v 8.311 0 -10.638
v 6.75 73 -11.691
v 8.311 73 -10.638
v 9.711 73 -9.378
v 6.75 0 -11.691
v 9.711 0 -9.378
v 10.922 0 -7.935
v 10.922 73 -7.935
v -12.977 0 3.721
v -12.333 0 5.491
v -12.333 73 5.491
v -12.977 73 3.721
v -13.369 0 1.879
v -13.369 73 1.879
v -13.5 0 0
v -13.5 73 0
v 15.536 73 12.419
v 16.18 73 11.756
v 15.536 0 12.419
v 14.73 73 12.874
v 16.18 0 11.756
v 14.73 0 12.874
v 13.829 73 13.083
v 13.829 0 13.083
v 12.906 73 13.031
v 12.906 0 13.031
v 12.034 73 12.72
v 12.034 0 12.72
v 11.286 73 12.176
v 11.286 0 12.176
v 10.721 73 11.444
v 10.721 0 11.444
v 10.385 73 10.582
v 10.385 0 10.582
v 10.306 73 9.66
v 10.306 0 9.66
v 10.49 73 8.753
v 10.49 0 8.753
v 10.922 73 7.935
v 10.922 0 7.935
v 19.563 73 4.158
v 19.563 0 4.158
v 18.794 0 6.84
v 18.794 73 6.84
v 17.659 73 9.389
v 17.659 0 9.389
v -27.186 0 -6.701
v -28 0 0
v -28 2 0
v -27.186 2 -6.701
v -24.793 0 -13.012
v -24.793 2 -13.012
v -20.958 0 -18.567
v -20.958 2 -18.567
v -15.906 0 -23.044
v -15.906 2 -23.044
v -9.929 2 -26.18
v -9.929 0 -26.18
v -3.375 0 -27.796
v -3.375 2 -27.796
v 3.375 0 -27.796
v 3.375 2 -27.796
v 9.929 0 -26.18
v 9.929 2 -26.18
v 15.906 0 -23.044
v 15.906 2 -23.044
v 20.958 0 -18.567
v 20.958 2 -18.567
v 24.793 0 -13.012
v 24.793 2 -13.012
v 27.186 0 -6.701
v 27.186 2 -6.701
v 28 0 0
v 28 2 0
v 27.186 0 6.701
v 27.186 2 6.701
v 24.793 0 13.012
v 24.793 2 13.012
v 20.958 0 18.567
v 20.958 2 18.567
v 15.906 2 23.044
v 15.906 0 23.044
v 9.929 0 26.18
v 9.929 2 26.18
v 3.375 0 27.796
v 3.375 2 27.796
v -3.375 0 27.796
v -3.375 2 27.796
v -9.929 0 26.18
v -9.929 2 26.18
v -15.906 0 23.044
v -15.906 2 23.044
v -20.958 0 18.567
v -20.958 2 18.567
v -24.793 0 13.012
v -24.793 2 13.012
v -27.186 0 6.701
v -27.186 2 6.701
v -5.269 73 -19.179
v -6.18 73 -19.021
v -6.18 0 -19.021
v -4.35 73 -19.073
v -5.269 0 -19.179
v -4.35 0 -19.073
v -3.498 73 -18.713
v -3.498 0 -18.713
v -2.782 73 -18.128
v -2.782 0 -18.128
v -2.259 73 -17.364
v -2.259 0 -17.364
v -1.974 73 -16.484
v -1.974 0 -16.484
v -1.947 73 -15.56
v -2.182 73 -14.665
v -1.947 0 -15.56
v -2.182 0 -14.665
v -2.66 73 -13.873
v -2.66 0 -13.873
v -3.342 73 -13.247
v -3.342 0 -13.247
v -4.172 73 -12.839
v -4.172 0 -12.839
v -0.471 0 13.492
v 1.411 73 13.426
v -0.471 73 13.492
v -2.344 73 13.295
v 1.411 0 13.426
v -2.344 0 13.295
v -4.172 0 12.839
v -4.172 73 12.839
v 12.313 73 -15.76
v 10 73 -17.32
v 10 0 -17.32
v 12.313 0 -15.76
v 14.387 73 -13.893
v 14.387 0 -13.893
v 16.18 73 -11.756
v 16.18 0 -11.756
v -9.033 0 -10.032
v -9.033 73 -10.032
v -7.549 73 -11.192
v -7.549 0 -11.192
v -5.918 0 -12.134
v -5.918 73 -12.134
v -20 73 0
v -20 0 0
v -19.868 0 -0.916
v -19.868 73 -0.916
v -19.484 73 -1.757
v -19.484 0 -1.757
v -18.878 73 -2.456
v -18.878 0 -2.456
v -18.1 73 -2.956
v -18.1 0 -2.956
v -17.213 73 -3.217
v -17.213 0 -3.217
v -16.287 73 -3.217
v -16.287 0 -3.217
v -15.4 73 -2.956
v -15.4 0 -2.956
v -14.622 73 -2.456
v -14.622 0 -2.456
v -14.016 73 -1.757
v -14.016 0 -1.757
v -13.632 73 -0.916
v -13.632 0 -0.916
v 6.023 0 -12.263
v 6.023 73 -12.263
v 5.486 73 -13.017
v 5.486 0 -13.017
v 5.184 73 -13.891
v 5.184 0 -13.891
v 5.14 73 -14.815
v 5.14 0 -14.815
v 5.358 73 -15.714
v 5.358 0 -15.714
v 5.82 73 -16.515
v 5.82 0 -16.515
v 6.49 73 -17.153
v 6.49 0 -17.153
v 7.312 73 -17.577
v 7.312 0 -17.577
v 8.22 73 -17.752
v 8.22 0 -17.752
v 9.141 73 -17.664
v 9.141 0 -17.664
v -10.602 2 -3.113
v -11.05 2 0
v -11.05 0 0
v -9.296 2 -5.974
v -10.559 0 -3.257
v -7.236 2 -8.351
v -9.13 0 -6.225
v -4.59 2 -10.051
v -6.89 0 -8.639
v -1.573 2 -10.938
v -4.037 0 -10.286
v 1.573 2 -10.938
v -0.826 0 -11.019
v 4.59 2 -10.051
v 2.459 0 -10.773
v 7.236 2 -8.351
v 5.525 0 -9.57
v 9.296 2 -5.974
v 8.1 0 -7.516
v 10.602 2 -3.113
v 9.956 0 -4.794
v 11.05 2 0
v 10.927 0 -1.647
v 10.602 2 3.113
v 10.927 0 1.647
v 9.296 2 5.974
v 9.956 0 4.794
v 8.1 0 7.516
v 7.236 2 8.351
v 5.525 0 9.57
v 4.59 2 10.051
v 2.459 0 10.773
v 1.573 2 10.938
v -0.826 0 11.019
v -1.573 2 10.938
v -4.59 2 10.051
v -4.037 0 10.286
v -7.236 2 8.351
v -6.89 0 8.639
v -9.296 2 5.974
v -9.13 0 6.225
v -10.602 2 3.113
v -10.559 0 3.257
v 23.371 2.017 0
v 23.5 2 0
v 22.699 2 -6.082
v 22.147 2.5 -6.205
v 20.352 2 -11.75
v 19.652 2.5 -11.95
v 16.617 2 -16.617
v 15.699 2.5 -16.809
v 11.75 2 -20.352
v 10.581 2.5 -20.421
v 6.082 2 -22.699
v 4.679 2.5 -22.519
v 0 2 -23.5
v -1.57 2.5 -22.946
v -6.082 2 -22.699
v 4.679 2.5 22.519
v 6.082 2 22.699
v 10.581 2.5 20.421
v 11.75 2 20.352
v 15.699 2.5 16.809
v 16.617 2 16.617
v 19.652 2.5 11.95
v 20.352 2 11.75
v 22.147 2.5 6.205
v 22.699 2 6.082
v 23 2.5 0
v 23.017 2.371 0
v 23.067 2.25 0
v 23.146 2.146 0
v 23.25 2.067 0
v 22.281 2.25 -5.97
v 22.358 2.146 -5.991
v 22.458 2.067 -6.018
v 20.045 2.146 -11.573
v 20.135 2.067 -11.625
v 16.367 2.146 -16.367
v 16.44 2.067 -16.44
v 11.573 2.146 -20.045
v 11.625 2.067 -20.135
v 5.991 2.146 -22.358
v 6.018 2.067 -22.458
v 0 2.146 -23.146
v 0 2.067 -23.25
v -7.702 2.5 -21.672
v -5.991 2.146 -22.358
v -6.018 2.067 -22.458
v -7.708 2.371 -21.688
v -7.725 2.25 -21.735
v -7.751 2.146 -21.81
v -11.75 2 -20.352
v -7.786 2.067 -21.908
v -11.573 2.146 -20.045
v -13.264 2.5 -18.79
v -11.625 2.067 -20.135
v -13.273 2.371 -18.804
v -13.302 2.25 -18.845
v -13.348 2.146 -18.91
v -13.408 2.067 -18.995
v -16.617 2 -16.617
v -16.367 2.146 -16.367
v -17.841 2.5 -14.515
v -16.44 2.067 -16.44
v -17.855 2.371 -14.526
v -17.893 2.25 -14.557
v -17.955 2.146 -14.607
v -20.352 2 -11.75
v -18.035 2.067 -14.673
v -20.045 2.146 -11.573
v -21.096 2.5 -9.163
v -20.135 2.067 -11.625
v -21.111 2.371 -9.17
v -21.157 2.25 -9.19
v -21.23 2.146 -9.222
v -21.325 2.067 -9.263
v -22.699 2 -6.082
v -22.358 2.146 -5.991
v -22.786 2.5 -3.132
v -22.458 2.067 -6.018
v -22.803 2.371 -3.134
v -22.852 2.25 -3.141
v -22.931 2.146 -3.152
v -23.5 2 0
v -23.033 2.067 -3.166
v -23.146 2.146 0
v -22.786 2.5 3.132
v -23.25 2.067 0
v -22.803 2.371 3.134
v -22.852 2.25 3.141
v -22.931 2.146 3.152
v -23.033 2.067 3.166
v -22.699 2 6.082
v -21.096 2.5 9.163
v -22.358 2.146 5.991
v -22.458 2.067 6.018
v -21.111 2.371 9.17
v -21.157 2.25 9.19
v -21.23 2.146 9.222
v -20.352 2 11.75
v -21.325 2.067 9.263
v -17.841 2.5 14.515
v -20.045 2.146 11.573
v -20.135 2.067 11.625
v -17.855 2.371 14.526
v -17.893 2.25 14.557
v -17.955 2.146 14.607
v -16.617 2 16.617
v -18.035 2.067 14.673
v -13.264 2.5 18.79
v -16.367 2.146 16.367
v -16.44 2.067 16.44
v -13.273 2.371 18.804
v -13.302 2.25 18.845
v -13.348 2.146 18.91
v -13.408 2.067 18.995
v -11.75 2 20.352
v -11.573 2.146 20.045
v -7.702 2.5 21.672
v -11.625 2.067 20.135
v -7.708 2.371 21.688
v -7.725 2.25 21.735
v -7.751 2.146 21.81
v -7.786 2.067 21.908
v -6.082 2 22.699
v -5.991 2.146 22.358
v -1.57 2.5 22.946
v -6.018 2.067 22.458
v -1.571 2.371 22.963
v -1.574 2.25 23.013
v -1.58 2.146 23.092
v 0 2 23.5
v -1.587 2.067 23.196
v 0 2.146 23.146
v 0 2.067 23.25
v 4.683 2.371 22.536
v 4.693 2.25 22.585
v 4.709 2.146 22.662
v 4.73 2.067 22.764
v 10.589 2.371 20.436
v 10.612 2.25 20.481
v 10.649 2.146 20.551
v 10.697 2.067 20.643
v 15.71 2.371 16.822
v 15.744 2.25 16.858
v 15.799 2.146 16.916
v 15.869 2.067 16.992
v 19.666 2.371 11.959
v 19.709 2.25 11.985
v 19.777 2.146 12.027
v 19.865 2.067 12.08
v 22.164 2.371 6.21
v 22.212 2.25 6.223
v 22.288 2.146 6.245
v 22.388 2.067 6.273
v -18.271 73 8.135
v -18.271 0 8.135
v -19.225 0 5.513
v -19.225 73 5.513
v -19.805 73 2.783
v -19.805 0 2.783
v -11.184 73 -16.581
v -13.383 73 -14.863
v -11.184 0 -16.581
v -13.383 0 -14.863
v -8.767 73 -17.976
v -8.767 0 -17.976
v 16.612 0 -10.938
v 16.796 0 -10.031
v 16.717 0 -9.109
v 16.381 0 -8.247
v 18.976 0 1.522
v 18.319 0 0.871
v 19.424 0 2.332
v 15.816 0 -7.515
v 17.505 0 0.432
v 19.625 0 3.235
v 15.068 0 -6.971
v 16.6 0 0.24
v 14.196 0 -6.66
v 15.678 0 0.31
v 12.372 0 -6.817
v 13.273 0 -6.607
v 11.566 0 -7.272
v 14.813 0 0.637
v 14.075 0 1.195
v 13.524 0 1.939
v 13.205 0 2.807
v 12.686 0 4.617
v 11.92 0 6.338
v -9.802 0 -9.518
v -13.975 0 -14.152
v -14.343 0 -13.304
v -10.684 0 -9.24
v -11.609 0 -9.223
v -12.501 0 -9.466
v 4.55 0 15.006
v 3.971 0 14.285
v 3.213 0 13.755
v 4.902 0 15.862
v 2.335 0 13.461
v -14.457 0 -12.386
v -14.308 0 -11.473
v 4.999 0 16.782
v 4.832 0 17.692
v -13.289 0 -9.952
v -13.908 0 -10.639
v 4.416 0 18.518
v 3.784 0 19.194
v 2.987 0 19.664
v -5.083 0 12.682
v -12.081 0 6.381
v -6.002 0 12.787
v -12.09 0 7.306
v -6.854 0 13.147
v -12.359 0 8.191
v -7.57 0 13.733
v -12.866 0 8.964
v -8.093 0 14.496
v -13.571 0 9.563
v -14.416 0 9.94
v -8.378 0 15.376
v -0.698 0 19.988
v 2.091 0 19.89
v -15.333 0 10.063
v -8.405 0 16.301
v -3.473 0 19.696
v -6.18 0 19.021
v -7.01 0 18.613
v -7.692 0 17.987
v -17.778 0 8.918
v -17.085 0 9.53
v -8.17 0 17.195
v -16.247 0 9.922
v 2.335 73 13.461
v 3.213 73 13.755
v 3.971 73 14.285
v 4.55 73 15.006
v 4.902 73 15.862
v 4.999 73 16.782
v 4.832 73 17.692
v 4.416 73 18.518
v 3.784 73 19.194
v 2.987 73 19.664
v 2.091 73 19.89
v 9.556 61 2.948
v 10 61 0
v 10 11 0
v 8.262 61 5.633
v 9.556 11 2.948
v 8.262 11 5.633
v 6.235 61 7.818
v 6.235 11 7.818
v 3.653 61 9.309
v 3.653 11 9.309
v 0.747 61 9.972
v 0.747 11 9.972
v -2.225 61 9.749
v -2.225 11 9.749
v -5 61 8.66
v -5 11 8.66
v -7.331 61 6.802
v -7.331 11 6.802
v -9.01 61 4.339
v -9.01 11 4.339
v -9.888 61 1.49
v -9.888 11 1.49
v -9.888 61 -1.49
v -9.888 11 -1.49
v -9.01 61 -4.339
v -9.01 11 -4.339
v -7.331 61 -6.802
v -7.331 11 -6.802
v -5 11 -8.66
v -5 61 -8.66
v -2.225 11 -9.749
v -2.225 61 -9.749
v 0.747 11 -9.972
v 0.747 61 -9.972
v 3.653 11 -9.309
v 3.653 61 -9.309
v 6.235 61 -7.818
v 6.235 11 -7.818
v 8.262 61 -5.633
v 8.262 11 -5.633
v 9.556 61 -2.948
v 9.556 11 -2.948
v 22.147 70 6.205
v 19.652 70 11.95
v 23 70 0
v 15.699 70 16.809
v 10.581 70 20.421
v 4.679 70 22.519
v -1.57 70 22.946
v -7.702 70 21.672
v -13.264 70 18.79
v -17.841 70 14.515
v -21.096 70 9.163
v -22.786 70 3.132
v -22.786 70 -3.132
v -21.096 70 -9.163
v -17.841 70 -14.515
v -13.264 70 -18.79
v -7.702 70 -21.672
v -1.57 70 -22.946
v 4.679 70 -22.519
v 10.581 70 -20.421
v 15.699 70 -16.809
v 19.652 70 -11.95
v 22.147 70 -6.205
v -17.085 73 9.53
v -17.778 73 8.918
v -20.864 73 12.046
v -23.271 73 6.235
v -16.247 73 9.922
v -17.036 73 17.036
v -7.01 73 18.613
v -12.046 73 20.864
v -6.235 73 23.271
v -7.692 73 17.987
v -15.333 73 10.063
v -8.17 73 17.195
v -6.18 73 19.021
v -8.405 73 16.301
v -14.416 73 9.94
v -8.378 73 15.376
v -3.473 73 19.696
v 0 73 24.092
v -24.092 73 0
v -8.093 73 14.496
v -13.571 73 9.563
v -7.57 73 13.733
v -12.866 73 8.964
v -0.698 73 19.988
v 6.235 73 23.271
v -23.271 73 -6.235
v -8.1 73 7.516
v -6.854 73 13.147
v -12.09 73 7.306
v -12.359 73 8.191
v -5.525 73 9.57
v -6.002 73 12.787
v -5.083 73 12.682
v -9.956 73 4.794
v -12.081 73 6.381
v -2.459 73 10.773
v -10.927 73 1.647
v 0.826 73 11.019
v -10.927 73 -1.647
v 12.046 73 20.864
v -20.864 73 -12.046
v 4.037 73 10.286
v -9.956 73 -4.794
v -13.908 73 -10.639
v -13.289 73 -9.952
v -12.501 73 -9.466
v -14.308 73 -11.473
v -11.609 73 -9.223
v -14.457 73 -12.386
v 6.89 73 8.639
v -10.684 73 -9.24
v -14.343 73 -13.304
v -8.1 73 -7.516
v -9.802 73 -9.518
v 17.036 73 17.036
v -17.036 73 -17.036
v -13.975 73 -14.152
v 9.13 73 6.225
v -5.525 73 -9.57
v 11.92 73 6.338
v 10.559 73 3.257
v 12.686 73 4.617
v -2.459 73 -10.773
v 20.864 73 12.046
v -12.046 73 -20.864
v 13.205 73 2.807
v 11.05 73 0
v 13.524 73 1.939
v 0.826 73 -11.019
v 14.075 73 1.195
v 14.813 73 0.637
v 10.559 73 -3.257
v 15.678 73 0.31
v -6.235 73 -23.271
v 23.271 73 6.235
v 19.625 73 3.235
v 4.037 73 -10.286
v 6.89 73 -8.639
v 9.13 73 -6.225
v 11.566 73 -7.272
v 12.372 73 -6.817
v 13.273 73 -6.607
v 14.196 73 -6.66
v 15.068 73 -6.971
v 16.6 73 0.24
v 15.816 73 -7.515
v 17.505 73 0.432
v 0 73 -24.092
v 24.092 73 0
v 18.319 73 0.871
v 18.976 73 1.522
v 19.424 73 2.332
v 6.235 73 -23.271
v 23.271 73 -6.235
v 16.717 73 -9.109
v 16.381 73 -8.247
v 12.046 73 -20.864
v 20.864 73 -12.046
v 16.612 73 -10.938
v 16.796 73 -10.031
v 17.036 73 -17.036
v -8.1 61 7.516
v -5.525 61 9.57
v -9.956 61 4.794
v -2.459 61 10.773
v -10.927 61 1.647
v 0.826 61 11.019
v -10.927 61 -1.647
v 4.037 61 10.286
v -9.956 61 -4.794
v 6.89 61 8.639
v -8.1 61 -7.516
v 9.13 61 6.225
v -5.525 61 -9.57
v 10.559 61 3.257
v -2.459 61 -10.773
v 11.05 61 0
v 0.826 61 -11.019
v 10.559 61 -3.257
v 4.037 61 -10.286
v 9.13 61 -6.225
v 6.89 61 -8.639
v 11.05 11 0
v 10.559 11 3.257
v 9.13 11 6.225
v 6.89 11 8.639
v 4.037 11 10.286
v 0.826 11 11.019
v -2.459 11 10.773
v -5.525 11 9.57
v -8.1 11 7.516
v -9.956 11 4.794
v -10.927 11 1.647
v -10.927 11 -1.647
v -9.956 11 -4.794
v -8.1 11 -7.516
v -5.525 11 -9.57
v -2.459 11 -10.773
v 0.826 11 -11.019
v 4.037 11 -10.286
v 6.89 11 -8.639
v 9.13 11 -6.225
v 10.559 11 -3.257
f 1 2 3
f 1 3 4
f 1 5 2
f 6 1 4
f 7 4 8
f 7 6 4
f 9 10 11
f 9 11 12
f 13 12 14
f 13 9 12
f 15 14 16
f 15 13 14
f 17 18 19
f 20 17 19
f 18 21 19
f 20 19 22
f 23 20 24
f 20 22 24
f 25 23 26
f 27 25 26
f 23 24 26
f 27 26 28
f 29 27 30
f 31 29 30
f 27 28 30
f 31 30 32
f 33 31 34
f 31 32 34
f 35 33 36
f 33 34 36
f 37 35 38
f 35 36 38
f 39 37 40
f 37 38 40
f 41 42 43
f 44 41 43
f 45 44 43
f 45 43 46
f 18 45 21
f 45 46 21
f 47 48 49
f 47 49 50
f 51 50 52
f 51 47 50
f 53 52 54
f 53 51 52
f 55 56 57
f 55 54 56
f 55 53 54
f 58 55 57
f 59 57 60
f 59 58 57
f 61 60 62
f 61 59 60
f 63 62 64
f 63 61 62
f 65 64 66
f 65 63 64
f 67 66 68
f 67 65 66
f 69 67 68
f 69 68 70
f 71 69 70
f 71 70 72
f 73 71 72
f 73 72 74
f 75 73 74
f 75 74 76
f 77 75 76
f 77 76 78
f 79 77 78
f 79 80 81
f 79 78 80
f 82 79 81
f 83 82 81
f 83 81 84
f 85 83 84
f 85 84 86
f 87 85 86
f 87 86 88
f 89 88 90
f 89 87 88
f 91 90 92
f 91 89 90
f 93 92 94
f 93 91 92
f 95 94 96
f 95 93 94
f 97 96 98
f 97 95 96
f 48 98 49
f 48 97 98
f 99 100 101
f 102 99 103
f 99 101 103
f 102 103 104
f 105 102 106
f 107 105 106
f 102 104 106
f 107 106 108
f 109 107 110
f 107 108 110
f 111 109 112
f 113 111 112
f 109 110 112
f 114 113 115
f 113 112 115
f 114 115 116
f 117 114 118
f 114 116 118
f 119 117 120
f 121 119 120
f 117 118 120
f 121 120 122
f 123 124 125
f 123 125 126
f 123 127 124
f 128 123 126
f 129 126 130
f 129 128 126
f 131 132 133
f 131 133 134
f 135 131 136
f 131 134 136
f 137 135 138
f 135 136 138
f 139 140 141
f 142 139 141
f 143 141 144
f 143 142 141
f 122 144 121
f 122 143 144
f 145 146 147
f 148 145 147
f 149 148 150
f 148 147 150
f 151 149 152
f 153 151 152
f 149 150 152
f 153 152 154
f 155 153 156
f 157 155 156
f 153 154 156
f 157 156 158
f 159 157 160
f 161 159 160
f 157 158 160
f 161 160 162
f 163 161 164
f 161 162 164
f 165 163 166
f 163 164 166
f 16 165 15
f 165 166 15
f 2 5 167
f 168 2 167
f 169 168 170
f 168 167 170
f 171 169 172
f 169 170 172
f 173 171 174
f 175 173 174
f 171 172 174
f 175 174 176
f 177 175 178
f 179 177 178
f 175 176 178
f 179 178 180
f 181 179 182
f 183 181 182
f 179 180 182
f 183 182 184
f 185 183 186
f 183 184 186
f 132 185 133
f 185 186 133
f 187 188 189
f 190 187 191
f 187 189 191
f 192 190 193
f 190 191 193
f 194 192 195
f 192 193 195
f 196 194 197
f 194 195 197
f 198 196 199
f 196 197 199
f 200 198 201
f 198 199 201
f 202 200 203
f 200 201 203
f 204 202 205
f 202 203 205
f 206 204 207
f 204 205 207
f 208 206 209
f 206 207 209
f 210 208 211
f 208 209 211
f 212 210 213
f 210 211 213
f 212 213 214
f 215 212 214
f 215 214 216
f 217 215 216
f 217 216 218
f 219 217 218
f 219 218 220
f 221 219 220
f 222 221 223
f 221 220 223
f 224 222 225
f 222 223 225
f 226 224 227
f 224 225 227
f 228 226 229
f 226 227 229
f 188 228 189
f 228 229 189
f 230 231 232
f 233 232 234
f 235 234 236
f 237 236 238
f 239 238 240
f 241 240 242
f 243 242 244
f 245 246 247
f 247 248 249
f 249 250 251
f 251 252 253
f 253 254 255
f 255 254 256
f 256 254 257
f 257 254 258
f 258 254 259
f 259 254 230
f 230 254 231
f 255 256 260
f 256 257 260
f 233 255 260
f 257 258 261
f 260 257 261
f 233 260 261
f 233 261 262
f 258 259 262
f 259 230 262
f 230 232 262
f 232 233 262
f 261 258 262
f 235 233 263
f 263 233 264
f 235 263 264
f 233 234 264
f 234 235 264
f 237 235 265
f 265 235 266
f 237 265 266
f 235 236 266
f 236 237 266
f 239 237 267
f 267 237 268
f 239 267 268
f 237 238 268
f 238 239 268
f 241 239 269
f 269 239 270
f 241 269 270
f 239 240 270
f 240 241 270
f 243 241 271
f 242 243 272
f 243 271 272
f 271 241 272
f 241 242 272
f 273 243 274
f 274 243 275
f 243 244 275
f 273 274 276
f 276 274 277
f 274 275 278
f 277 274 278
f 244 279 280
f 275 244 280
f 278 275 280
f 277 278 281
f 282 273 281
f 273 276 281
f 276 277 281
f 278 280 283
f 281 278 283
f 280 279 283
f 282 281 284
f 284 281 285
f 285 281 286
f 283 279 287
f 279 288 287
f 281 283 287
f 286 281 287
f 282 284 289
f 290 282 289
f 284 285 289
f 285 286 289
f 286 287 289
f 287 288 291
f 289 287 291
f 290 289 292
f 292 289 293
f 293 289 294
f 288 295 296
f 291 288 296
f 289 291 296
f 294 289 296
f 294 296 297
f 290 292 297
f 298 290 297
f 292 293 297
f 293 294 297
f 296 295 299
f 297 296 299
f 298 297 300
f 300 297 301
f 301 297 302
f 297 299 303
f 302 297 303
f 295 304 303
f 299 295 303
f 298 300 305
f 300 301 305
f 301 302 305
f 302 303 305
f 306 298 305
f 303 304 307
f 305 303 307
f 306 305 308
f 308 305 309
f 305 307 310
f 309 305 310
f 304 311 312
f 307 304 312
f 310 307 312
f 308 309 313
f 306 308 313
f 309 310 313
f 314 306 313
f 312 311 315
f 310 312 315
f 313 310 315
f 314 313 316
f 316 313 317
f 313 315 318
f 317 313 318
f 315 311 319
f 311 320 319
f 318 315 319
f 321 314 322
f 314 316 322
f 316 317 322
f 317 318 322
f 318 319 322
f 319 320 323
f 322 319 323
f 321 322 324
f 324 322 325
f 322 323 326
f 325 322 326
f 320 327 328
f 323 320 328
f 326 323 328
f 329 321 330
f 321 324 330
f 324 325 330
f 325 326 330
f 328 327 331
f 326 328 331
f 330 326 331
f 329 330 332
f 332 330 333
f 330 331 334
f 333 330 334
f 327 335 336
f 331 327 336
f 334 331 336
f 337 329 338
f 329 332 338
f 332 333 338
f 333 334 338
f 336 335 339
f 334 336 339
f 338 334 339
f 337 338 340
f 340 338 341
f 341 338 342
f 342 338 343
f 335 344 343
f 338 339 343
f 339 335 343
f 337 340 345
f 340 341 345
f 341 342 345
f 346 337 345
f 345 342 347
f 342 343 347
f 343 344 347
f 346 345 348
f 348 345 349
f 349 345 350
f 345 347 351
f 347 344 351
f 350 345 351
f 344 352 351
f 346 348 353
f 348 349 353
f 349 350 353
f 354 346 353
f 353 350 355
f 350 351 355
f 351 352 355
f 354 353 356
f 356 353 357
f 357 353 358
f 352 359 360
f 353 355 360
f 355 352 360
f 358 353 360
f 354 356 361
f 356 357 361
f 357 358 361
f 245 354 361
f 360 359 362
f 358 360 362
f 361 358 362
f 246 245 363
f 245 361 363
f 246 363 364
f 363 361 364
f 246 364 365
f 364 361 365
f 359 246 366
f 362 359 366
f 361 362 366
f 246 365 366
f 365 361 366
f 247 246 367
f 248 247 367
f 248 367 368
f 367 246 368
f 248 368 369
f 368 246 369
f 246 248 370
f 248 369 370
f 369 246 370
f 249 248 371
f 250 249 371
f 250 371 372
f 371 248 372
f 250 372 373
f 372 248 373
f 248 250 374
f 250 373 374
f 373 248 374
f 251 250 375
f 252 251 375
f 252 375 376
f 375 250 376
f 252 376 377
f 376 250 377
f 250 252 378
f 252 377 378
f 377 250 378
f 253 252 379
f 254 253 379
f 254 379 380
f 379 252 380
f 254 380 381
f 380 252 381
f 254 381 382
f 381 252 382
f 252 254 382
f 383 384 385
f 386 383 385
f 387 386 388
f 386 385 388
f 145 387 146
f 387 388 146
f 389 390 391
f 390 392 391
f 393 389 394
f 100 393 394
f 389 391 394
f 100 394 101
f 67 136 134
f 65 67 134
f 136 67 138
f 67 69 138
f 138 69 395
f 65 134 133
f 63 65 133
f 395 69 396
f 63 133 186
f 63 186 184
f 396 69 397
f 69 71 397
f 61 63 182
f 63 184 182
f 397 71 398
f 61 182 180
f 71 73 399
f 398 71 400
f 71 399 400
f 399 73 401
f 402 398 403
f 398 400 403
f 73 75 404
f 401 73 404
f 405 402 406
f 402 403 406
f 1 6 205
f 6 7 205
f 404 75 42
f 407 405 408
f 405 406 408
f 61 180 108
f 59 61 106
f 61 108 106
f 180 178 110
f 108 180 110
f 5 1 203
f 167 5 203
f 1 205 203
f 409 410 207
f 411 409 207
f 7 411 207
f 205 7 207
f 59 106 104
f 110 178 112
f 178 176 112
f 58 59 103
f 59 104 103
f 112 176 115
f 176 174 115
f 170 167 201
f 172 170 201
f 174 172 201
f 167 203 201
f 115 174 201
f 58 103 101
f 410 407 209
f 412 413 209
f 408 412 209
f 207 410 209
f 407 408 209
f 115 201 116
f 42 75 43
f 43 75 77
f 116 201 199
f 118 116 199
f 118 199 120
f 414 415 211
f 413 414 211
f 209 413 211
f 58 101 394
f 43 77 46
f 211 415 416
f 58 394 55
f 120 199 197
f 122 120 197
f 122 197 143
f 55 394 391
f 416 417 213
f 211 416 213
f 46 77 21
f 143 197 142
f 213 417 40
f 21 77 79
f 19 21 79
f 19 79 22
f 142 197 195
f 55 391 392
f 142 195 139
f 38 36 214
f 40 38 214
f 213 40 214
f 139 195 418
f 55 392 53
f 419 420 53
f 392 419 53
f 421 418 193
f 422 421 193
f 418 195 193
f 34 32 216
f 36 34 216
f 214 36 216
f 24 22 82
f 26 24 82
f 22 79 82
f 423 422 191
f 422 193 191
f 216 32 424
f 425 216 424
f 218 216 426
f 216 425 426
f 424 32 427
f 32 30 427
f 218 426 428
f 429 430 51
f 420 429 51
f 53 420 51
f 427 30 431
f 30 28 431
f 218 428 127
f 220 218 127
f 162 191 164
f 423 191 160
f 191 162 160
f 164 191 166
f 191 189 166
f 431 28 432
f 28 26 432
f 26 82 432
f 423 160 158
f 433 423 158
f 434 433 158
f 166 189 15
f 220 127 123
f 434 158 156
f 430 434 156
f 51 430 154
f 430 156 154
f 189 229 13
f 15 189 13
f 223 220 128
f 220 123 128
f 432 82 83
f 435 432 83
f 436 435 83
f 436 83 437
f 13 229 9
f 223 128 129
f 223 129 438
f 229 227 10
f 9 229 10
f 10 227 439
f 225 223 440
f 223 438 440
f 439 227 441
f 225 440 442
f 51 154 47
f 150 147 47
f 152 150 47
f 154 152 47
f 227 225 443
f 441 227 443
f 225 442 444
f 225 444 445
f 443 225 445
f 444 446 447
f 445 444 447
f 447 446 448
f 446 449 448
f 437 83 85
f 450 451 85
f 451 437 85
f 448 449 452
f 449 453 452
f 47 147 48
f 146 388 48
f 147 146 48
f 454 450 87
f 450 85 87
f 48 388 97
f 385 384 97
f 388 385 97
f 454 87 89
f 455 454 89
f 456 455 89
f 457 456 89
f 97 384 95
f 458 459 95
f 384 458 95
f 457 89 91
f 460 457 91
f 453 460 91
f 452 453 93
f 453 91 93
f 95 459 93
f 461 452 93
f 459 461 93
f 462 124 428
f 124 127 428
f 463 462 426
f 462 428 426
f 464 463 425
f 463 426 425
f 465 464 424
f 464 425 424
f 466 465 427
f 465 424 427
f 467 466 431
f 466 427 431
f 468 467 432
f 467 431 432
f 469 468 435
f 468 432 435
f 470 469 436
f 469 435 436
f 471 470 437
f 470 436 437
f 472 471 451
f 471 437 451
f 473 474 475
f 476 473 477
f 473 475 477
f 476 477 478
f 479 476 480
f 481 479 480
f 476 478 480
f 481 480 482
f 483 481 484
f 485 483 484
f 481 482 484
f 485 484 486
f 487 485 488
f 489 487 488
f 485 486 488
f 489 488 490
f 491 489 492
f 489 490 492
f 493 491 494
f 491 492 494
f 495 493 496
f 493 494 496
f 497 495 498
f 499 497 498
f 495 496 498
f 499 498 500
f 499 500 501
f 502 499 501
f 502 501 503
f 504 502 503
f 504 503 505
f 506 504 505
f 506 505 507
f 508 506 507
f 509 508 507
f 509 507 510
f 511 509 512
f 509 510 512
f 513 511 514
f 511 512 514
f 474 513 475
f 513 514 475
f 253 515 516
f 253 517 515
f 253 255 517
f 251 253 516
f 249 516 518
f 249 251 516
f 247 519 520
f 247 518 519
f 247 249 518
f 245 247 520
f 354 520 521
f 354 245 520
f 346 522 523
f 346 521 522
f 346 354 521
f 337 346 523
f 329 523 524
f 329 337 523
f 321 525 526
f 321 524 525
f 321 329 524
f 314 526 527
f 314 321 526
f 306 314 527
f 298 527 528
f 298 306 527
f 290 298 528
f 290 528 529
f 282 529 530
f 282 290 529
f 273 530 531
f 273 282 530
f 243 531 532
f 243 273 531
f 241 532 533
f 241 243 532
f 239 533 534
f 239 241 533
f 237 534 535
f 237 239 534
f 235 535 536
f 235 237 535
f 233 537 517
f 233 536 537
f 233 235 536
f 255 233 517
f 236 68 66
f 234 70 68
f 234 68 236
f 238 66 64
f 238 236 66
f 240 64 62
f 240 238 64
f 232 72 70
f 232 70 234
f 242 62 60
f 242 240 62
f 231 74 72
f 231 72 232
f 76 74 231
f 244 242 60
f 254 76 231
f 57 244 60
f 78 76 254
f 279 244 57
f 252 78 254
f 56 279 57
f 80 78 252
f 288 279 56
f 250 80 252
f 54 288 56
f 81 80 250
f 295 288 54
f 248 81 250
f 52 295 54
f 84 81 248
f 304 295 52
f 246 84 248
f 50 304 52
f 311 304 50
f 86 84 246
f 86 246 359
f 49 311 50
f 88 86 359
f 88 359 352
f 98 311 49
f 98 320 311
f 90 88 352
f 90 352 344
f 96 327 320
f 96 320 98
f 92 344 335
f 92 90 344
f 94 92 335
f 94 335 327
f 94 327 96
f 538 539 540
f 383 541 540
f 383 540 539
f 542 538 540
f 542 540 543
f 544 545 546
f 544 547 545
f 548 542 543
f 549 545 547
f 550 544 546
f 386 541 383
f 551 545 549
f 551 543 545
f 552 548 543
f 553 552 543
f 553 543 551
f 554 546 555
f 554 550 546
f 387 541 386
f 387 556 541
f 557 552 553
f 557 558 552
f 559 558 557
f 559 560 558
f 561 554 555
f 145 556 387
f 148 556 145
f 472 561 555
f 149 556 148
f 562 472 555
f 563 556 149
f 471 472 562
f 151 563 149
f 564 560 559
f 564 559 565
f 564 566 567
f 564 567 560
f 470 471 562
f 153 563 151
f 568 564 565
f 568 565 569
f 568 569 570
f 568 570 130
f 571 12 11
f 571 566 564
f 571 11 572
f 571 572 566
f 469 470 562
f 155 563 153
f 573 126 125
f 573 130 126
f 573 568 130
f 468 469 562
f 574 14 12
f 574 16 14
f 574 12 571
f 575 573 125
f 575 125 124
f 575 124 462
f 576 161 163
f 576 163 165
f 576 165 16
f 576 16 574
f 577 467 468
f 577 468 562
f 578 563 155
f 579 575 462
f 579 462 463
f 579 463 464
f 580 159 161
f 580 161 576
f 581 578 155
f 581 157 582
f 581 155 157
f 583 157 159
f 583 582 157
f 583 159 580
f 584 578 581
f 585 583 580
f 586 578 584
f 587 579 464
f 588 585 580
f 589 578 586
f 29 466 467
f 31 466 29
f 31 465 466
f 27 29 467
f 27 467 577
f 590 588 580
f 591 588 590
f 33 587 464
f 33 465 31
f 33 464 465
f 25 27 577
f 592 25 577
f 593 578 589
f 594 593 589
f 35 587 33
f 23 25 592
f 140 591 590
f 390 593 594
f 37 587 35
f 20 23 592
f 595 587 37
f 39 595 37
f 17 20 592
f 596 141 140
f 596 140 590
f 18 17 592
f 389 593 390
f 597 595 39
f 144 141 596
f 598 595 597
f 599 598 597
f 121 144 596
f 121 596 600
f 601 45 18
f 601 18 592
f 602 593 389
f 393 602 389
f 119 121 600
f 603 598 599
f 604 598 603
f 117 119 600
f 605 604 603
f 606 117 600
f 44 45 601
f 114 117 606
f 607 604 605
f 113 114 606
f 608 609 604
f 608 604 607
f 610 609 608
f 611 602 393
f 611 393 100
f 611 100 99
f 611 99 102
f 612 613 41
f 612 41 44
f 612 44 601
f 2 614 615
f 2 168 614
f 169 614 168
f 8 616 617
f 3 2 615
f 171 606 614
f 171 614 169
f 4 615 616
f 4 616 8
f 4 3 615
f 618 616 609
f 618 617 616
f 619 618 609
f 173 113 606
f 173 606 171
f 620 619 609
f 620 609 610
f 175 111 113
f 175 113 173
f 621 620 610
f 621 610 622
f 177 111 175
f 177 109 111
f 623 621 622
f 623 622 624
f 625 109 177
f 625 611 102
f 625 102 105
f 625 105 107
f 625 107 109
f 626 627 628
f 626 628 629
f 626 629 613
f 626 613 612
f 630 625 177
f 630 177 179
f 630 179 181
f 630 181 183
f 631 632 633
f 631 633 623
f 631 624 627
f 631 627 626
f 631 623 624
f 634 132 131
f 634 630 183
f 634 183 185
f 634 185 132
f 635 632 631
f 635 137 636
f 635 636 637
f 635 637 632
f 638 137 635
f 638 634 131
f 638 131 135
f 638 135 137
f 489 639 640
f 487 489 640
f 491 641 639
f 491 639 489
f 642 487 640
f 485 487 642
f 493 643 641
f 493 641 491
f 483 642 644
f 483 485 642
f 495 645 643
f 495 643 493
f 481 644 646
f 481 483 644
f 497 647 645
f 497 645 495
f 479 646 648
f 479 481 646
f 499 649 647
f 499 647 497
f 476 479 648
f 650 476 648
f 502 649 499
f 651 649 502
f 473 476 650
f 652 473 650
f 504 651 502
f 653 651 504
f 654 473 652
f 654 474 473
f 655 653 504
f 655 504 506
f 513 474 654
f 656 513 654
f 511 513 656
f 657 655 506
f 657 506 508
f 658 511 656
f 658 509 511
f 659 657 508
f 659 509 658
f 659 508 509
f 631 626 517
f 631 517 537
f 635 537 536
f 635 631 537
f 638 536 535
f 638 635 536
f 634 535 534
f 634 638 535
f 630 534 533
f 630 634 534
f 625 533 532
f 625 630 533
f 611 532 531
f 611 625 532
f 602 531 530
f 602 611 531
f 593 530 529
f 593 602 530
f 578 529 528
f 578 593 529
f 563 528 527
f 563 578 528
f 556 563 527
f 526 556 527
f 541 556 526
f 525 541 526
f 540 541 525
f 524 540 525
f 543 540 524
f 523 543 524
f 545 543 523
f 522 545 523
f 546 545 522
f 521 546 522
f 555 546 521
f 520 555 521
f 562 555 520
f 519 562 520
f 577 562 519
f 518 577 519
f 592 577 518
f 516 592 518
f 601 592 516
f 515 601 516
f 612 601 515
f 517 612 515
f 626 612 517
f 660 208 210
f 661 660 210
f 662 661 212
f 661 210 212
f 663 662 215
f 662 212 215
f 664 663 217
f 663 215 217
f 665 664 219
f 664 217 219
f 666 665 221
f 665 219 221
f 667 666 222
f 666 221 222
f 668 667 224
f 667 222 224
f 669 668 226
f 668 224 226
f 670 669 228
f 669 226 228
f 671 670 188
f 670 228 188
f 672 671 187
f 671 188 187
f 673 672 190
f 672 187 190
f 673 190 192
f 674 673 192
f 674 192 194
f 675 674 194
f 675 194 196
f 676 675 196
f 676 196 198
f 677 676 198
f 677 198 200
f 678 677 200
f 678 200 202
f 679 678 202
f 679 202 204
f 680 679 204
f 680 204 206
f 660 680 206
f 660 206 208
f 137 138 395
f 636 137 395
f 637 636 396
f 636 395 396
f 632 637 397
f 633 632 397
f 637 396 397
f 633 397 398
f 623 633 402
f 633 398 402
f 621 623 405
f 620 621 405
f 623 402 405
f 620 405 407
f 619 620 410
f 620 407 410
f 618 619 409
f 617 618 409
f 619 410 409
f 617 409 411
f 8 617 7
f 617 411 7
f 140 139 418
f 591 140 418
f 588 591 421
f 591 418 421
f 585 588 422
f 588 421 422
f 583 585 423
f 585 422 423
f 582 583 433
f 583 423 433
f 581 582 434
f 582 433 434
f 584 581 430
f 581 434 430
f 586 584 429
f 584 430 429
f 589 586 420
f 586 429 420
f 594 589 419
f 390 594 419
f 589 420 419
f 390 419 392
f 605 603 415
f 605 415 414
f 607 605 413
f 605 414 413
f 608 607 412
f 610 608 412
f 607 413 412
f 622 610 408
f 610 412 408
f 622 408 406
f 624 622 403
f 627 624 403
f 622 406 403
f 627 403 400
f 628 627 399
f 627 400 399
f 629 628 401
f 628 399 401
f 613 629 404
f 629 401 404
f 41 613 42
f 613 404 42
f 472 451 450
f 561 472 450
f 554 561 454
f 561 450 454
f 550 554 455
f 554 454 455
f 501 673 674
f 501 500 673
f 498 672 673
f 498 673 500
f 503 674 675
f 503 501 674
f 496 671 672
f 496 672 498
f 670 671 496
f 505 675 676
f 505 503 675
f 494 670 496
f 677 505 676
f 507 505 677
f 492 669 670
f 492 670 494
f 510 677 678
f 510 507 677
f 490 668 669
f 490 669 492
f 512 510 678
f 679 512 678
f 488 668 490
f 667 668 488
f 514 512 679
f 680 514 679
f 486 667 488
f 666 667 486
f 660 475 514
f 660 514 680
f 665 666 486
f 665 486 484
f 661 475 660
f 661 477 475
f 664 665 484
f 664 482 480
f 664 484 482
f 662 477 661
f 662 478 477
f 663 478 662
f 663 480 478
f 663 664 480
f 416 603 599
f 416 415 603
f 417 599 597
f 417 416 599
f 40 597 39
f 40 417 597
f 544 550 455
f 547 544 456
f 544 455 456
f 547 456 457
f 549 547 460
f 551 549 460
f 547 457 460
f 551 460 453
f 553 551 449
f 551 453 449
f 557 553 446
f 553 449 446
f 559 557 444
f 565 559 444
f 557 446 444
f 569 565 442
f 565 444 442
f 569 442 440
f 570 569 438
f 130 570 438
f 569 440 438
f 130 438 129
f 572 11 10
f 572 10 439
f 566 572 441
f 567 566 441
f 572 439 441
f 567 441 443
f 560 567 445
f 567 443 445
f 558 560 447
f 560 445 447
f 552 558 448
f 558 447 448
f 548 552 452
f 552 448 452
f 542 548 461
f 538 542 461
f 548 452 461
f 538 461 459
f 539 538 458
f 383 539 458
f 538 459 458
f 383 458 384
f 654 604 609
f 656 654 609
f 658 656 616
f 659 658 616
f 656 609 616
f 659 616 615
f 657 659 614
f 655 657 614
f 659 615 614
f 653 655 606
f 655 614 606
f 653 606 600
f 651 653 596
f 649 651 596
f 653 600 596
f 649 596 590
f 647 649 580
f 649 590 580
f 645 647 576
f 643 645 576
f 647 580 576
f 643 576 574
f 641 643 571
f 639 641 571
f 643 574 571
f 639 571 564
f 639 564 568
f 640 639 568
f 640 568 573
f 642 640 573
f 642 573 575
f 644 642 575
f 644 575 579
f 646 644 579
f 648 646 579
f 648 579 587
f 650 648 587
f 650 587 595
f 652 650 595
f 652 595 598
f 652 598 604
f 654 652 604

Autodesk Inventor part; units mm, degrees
ref_plane "YZ Plane" through (0, 0, 0) normal (1, 0, 0) x (0, 1, 0)
ref_plane "XZ Plane" through (0, 0, 0) normal (0, 1, 0) x (-1, 0, 0)
ref_plane "XY Plane" through (0, 0, 0) normal (0, 0, 1) x (1, 0, 0)
sketch "Sketch1" plane through (0, 0, 0) normal (0, 1, 0) x (-1, 0, 0)
  circle A0 centre (0, 0) radius 11.05
  circle A1 centre (0, 0) radius 28
  dimension "d0" = 22.1
  dimension "d1" = 56
extrude "Extrusion1" add sketch "Sketch1" along normal blind 2
sketch "Sketch2" plane through (0, 2, 0) normal (0, 1, 0) x (1, 0, 0)
  circle A0 centre (0, 0) radius 23
  dimension "d4" = 46
extrude "Extrusion2" add sketch "Sketch2" along normal blind 68
sketch "Sketch3" plane through (0, 70, 0) normal (0, 1, 0) x (1, 0, 0)
  circle A0 centre (0, 0) radius 23 projected
extrude "Extrusion3" add sketch "Sketch3" along normal blind 3 draft 20
sketch "Sketch4" plane through (0, 2, 0) normal (0, -1, 0) x (1, 0, 0)
  circle A0 centre (0, 0) radius 11.05 projected
extrude "Extrusion4" cut sketch "Sketch4" against normal blind 9
sketch "Sketch5" plane through (0, 11, 0) normal (0, -1, 0) x (1, 0, 0)
  circle A0 centre (0, 0) radius 10
  dimension "d11" = 20
extrude "Extrusion5" cut sketch "Sketch5" against normal up to next
sketch "Sketch6" plane through (0, 73, 0) normal (0, 1, 0) x (1, 0, 0)
  circle A0 centre (0, 0) radius 11.05
  dimension "d14" = 22.1
extrude "Extrusion6" cut sketch "Sketch6" against normal blind 12
sketch "Sketch7" plane through (0, 0, 0) normal (0, -1, 0) x (1, 0, 0)
  circle A0 centre (0, 0) radius 11.05 projected
  circle A1 centre (0, 0) radius 28 projected
  line L0 (0, 0) -> (43.5603, 0) construction
  line L1 (-10.3416, 8.6776) -> (-15.3209, 12.8558) construction
  arc A2 (-15.3019, 6.8128) -> (-16.75, 0) centre (0, 0) ccw construction
  arc A3 (-18.2709, 8.1347) -> (-20, 0) centre (0, 0) ccw
  arc A4 (-12.3329, 5.4909) -> (-13.5, 0) centre (0, 0) ccw
  arc A5 (-12.3329, 5.4909) -> (-18.2709, 8.1347) centre (-15.3019, 6.8128) ccw
  arc A6 (-20, 0) -> (-13.5, 0) centre (-16.75, 0) ccw
  arc A7 (-9.0333, -10.0325) -> (-13.3826, -14.8629) centre (-11.2079, -12.4477) ccw
  arc A8 (-6.1803, -19.0211) -> (-4.1717, -12.8393) centre (-5.176, -15.9302) ccw
  arc A9 (6.75, -11.6913) -> (10, -17.3205) centre (8.375, -14.5059) ccw
  arc A10 (16.1803, -11.7557) -> (10.9217, -7.9351) centre (13.551, -9.8454) ccw
  arc A11 (13.205, 2.8068) -> (19.563, 4.1582) centre (16.384, 3.4825) ccw
  arc A12 (16.1803, 11.7557) -> (10.9217, 7.9351) centre (13.551, 9.8454) ccw
  arc A13 (1.4111, 13.426) -> (2.0906, 19.8904) centre (1.7509, 16.6582) ccw
  arc A14 (-6.1803, 19.0211) -> (-4.1717, 12.8393) centre (-5.176, 15.9302) ccw
  arc A15 (-12.3329, 5.4909) -> (-13.5, 0) centre (0, 0) ccw
  arc A16 (-18.2709, 8.1347) -> (-20, 0) centre (0, 0) ccw
  arc A17 (-13.3826, -14.8629) -> (-6.1803, -19.0211) centre (0, 0) ccw
  arc A18 (-9.0333, -10.0325) -> (-4.1717, -12.8393) centre (0, 0) ccw
  arc A19 (10, -17.3205) -> (16.1803, -11.7557) centre (0, 0) ccw
  arc A20 (6.75, -11.6913) -> (10.9217, -7.9351) centre (0, 0) ccw
  arc A21 (13.205, 2.8068) -> (10.9217, 7.9351) centre (0, 0) ccw
  arc A22 (1.4111, 13.426) -> (-4.1717, 12.8393) centre (0, 0) ccw
  arc A23 (19.563, 4.1582) -> (16.1803, 11.7557) centre (0, 0) ccw
  arc A24 (2.0906, 19.8904) -> (-6.1803, 19.0211) centre (0, 0) ccw
  point P0 (-12.8312, 10.7667)
  point P1 (-14.2048, 8.8761)
  point P2 (-16.1011, 4.6169)
  point P3 (-16.587, 2.3311)
  dimension "d22" = 40
  dimension "d26" = 360
extrude "Extrusion7" cut sketch "Sketch7" against normal up to next contours A5 A4 A6 A3 | A18 A8 A17 A7 | A20 A10 A19 A9 | A21 A12 A23 A11 | A22 A14 A24 A13
fillet "Fillet1" radius 0.5 1 edges at (-23, 2, 0)
properties part number "spooler big"
